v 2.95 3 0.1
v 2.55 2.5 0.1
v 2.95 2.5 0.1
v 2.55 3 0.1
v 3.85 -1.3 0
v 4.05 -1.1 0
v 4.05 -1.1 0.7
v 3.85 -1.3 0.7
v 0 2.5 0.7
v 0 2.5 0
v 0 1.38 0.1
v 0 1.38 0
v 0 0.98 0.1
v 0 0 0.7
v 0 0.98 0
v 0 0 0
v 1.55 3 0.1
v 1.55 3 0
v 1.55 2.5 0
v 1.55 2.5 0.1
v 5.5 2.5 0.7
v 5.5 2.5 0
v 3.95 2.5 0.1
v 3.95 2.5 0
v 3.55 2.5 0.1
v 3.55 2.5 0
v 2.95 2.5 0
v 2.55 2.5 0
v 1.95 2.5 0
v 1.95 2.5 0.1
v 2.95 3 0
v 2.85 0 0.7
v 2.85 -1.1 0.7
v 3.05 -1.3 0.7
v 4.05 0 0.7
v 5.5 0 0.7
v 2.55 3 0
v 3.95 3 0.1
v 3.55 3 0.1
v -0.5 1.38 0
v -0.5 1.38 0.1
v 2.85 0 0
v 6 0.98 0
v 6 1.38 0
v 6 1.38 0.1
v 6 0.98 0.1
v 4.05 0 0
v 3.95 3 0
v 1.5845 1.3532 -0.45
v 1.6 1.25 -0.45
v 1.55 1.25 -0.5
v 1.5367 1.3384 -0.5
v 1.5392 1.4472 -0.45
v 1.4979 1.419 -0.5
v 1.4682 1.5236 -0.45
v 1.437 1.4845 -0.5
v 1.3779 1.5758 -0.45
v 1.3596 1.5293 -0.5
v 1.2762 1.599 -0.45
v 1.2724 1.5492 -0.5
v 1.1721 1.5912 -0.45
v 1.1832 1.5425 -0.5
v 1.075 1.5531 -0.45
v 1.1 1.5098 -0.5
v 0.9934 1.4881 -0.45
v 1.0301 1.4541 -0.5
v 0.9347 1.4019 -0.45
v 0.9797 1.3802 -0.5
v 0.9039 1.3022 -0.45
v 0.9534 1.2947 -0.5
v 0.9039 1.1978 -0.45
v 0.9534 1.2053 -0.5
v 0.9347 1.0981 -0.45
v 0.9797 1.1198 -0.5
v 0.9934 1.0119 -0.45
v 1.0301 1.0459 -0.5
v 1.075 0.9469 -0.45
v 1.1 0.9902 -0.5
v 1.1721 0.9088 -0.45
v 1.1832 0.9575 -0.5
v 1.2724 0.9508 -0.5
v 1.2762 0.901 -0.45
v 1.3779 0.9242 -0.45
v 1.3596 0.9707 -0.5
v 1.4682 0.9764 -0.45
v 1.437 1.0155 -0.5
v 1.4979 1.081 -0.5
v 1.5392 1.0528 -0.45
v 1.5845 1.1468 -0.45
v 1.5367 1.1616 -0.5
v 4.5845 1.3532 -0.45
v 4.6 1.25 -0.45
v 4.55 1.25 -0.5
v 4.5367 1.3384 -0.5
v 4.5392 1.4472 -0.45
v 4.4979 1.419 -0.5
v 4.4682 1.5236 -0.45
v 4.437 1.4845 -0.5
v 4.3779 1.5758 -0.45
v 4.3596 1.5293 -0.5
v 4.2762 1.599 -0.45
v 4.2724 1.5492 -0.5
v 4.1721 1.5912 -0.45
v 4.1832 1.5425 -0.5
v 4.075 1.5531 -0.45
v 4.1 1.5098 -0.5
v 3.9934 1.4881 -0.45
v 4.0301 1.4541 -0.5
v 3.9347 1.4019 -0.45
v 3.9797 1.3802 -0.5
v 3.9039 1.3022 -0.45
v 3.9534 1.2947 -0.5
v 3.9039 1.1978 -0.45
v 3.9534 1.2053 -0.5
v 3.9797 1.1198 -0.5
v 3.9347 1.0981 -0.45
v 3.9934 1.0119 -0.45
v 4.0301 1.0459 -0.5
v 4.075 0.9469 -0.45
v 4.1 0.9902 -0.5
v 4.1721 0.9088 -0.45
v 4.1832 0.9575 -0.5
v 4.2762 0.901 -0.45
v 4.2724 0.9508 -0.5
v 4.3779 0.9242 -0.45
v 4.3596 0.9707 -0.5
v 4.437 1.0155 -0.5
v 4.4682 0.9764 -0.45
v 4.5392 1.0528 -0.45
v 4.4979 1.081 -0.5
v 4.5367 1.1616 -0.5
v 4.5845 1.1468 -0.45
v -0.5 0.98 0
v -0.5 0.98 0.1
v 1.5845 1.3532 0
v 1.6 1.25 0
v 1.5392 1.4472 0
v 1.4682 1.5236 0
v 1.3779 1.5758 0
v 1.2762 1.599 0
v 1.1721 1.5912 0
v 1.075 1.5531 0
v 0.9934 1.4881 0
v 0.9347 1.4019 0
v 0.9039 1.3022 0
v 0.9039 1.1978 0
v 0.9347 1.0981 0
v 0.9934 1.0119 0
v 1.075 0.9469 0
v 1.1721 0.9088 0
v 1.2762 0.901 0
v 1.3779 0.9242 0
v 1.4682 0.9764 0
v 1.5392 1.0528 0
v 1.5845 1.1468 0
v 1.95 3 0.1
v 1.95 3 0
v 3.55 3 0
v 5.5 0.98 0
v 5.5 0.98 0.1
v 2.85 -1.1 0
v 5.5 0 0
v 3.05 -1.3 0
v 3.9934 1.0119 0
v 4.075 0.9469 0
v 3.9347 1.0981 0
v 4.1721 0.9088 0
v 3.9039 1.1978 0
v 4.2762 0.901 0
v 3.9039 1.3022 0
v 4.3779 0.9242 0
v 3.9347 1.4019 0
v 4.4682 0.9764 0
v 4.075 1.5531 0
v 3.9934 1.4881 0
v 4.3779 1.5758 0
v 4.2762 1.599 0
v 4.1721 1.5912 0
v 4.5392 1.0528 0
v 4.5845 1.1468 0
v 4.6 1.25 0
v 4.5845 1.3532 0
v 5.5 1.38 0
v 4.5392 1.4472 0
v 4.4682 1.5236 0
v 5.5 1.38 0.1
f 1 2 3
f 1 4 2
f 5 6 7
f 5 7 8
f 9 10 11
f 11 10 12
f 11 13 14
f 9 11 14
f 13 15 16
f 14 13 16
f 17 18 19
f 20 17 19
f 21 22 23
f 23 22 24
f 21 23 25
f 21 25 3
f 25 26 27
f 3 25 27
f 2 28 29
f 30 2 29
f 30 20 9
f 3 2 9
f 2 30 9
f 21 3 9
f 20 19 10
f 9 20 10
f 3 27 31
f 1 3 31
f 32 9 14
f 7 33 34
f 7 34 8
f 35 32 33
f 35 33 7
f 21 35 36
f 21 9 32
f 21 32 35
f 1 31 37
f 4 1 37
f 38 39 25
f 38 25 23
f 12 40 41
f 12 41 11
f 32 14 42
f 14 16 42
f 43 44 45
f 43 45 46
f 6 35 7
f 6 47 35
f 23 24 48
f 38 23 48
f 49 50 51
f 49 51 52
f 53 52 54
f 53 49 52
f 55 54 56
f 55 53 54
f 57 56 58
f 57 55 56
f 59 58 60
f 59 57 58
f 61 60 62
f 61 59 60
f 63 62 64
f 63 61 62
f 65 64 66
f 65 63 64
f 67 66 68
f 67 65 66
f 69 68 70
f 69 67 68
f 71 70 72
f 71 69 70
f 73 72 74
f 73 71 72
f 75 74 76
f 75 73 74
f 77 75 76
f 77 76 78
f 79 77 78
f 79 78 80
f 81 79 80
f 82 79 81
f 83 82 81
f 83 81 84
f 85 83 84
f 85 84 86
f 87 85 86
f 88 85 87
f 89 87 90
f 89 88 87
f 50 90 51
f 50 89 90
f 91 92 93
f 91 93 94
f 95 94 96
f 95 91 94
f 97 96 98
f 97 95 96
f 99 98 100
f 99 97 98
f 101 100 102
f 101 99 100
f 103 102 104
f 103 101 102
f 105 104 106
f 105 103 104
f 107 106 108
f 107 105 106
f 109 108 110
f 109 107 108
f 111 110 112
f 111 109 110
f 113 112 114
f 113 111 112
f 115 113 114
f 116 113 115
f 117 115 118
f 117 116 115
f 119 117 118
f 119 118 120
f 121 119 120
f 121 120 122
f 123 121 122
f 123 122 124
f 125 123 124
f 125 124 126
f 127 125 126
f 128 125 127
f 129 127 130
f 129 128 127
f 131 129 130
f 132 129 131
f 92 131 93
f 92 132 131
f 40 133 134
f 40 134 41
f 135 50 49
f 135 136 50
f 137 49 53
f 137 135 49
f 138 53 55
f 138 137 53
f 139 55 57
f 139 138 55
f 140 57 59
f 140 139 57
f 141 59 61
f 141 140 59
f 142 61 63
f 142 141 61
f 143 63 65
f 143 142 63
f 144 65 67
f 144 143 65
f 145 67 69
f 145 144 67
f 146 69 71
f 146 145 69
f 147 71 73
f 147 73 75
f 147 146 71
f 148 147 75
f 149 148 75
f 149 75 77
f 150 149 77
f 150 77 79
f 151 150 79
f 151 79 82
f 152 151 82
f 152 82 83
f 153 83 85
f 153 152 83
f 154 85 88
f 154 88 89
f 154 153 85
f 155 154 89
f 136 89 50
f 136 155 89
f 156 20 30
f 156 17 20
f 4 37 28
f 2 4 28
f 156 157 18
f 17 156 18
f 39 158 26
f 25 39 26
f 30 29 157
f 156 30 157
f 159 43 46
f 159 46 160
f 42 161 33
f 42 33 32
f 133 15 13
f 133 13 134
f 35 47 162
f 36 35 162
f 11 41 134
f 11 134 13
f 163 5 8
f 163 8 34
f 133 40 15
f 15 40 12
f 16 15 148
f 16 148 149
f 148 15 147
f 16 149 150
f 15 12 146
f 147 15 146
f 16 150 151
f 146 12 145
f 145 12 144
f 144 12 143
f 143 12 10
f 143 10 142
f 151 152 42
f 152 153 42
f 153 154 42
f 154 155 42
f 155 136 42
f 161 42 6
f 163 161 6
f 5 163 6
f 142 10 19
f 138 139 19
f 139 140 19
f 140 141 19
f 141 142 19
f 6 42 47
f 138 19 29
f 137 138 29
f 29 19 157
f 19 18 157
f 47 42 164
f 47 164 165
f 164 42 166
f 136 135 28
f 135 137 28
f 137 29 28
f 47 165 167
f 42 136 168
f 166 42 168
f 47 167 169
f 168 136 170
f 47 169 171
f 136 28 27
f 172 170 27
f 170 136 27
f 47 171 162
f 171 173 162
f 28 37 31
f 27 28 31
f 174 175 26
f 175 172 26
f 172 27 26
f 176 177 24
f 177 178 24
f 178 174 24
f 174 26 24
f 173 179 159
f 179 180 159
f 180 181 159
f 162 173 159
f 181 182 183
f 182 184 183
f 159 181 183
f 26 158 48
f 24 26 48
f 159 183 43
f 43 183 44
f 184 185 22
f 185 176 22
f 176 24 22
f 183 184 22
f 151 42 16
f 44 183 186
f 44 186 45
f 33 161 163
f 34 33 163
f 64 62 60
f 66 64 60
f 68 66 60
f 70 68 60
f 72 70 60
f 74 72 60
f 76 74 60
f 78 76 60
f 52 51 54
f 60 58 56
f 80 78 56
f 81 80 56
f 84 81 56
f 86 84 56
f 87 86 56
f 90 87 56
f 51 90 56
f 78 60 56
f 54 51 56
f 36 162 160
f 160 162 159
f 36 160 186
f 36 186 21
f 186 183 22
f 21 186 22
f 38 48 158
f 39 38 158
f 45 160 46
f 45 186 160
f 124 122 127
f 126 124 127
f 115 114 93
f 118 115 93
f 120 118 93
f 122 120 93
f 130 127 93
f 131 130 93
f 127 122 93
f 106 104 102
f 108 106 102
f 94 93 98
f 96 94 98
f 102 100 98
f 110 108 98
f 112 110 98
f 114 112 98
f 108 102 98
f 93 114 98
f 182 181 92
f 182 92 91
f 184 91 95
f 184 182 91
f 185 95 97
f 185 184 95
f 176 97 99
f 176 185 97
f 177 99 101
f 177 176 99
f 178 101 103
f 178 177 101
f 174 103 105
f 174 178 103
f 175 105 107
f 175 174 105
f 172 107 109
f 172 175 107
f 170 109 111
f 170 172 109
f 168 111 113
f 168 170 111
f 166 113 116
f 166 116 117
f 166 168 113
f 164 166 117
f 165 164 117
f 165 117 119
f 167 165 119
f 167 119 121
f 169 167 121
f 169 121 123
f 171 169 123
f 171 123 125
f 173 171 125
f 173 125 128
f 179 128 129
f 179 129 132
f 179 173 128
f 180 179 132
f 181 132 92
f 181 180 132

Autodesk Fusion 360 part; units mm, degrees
sketch "Sketch1" plane through (0, 0, 0) normal (0, 0, 1) x (1, 0, 0)
  line L0 (5.5, 0) -> (5.5, 2.5)
  line L1 (5.5, 2.5) -> (0, 2.5)
  line L2 (0, 2.5) -> (0, 0)
  line L3 (2.75, 2.5) -> (2.75, 0) construction
  line L4 (4.05, 0) -> (4.05, -1.1)
  line L5 (3.85, -1.3) -> (3.05, -1.3)
  line L6 (2.85, -1.1) -> (2.85, 0)
  line L7 (2.85, -1.1) -> (3.05, -1.3)
  line L8 (4.05, -1.1) -> (3.85, -1.3)
  line L9 (2.05, 2.5) -> (2.05, 0) construction
  line L10 (3.45, 2.5) -> (3.45, 0) construction
  line L11 (3.45, -1.3) -> (3.45, 0) construction
  line L12 (0, 1.25) -> (5.5, 1.25) construction
  line L13 (1.25, 2.5) -> (1.25, 0) construction
  line L14 (4.25, 2.5) -> (4.25, 0) construction
  circle A0 centre (1.25, 1.25) radius 0.35
  circle A1 centre (4.25, 1.25) radius 0.35
  line L15 (0, 1.18) -> (5.5, 1.18) construction
  line L16 (-0.5, 1.38) -> (0, 1.38)
  line L17 (0, 1.38) -> (0, 0.98)
  line L18 (0, 0.98) -> (-0.5, 0.98)
  line L19 (-0.5, 0.98) -> (-0.5, 1.38)
  line L20 (5.5, 0.98) -> (5.5, 1.38)
  line L21 (5.5, 1.38) -> (6, 1.38)
  line L22 (6, 1.38) -> (6, 0.98)
  line L23 (6, 0.98) -> (5.5, 0.98)
  line L24 (0, 0) -> (2.85, 0)
  line L25 (4.05, 0) -> (5.5, 0)
  line L26 (2.55, 2.5) -> (2.95, 2.5)
  line L27 (2.95, 2.5) -> (2.95, 3)
  line L28 (2.95, 3) -> (2.55, 3)
  line L29 (2.55, 3) -> (2.55, 2.5)
  line L30 (3.55, 2.5) -> (3.95, 2.5)
  line L31 (3.95, 2.5) -> (3.95, 3)
  line L32 (3.95, 3) -> (3.55, 3)
  line L33 (3.55, 3) -> (3.55, 2.5)
  line L34 (1.55, 2.5) -> (1.95, 2.5)
  line L35 (1.95, 2.5) -> (1.95, 3)
  line L36 (1.95, 3) -> (1.55, 3)
  line L37 (1.55, 3) -> (1.55, 2.5)
  point P0 (4.05, -1.3)
  point P1 (2.85, -1.3)
  point P2 (1.25, 1.25)
  point P3 (4.25, 1.25)
  point P4 (0, 1.18)
  point P5 (5.5, 1.18)
  point P6 (0, 1.18)
  point P7 (5.5, 1.18)
  point P8 (2.75, 2.5)
  point P9 (2.75, 2.5)
  point P10 (1.75, 2.5)
  point P11 (3.75, 2.5)
  point P12 (3.75, 2.5)
  point P13 (1.75, 2.5)
  dimension "d1" = 5.5
  dimension "d2" = 2.5
  dimension "d3" = 1.2
  dimension "d4" = 1.3
  dimension "d5" = 0.2
  dimension "d6" = 0.2
  dimension "d7" = 0.2
  dimension "d8" = 0.2
  dimension "d9" = 0.7
  dimension "d10" = -0.7
  dimension "d13" = 1.5
  dimension "d14" = -1.5
  dimension "d15" = 0.7
  dimension "d16" = 0.7
  dimension "d17" = 1.18
  dimension "d18" = 0.5
  dimension "d19" = 0.4
  dimension "d20" = 0.5
  dimension "d21" = 0.4
  dimension "d22" = 0.4
  dimension "d23" = 0.5
  dimension "d24" = 1
  dimension "d25" = 1
  dimension "d26" = 0.4
  dimension "d27" = 0.5
  dimension "d28" = 0.4
  dimension "d29" = 0.5
extrude "Extrude1" add sketch "Sketch1" along normal blind 0.7 contours L0 L1 L2 L4 L5 L6 L7 L8 L17 L20 L24 L25 L26 L30 L34 | A0 | A1
extrude "Extrude2" add sketch "Sketch1" against normal blind 0.5 contours A0 | A1
chamfer "Chamfer1" distance 0.05 angle 45 2 edges at (3.9237, 1.3766, -0.5) (0.9237, 1.3766, -0.5)
extrude "Extrude3" add sketch "Sketch1" along normal blind 0.1 contours L0 L20 L21 L22 L23 | L1 L30 L31 L32 L33 | L1 L26 L27 L28 L29 | L1 L34 L35 L36 L37 | L2 L16 L17 L18 L19
equation "d6 = d5"
equation "d8 = d7"
